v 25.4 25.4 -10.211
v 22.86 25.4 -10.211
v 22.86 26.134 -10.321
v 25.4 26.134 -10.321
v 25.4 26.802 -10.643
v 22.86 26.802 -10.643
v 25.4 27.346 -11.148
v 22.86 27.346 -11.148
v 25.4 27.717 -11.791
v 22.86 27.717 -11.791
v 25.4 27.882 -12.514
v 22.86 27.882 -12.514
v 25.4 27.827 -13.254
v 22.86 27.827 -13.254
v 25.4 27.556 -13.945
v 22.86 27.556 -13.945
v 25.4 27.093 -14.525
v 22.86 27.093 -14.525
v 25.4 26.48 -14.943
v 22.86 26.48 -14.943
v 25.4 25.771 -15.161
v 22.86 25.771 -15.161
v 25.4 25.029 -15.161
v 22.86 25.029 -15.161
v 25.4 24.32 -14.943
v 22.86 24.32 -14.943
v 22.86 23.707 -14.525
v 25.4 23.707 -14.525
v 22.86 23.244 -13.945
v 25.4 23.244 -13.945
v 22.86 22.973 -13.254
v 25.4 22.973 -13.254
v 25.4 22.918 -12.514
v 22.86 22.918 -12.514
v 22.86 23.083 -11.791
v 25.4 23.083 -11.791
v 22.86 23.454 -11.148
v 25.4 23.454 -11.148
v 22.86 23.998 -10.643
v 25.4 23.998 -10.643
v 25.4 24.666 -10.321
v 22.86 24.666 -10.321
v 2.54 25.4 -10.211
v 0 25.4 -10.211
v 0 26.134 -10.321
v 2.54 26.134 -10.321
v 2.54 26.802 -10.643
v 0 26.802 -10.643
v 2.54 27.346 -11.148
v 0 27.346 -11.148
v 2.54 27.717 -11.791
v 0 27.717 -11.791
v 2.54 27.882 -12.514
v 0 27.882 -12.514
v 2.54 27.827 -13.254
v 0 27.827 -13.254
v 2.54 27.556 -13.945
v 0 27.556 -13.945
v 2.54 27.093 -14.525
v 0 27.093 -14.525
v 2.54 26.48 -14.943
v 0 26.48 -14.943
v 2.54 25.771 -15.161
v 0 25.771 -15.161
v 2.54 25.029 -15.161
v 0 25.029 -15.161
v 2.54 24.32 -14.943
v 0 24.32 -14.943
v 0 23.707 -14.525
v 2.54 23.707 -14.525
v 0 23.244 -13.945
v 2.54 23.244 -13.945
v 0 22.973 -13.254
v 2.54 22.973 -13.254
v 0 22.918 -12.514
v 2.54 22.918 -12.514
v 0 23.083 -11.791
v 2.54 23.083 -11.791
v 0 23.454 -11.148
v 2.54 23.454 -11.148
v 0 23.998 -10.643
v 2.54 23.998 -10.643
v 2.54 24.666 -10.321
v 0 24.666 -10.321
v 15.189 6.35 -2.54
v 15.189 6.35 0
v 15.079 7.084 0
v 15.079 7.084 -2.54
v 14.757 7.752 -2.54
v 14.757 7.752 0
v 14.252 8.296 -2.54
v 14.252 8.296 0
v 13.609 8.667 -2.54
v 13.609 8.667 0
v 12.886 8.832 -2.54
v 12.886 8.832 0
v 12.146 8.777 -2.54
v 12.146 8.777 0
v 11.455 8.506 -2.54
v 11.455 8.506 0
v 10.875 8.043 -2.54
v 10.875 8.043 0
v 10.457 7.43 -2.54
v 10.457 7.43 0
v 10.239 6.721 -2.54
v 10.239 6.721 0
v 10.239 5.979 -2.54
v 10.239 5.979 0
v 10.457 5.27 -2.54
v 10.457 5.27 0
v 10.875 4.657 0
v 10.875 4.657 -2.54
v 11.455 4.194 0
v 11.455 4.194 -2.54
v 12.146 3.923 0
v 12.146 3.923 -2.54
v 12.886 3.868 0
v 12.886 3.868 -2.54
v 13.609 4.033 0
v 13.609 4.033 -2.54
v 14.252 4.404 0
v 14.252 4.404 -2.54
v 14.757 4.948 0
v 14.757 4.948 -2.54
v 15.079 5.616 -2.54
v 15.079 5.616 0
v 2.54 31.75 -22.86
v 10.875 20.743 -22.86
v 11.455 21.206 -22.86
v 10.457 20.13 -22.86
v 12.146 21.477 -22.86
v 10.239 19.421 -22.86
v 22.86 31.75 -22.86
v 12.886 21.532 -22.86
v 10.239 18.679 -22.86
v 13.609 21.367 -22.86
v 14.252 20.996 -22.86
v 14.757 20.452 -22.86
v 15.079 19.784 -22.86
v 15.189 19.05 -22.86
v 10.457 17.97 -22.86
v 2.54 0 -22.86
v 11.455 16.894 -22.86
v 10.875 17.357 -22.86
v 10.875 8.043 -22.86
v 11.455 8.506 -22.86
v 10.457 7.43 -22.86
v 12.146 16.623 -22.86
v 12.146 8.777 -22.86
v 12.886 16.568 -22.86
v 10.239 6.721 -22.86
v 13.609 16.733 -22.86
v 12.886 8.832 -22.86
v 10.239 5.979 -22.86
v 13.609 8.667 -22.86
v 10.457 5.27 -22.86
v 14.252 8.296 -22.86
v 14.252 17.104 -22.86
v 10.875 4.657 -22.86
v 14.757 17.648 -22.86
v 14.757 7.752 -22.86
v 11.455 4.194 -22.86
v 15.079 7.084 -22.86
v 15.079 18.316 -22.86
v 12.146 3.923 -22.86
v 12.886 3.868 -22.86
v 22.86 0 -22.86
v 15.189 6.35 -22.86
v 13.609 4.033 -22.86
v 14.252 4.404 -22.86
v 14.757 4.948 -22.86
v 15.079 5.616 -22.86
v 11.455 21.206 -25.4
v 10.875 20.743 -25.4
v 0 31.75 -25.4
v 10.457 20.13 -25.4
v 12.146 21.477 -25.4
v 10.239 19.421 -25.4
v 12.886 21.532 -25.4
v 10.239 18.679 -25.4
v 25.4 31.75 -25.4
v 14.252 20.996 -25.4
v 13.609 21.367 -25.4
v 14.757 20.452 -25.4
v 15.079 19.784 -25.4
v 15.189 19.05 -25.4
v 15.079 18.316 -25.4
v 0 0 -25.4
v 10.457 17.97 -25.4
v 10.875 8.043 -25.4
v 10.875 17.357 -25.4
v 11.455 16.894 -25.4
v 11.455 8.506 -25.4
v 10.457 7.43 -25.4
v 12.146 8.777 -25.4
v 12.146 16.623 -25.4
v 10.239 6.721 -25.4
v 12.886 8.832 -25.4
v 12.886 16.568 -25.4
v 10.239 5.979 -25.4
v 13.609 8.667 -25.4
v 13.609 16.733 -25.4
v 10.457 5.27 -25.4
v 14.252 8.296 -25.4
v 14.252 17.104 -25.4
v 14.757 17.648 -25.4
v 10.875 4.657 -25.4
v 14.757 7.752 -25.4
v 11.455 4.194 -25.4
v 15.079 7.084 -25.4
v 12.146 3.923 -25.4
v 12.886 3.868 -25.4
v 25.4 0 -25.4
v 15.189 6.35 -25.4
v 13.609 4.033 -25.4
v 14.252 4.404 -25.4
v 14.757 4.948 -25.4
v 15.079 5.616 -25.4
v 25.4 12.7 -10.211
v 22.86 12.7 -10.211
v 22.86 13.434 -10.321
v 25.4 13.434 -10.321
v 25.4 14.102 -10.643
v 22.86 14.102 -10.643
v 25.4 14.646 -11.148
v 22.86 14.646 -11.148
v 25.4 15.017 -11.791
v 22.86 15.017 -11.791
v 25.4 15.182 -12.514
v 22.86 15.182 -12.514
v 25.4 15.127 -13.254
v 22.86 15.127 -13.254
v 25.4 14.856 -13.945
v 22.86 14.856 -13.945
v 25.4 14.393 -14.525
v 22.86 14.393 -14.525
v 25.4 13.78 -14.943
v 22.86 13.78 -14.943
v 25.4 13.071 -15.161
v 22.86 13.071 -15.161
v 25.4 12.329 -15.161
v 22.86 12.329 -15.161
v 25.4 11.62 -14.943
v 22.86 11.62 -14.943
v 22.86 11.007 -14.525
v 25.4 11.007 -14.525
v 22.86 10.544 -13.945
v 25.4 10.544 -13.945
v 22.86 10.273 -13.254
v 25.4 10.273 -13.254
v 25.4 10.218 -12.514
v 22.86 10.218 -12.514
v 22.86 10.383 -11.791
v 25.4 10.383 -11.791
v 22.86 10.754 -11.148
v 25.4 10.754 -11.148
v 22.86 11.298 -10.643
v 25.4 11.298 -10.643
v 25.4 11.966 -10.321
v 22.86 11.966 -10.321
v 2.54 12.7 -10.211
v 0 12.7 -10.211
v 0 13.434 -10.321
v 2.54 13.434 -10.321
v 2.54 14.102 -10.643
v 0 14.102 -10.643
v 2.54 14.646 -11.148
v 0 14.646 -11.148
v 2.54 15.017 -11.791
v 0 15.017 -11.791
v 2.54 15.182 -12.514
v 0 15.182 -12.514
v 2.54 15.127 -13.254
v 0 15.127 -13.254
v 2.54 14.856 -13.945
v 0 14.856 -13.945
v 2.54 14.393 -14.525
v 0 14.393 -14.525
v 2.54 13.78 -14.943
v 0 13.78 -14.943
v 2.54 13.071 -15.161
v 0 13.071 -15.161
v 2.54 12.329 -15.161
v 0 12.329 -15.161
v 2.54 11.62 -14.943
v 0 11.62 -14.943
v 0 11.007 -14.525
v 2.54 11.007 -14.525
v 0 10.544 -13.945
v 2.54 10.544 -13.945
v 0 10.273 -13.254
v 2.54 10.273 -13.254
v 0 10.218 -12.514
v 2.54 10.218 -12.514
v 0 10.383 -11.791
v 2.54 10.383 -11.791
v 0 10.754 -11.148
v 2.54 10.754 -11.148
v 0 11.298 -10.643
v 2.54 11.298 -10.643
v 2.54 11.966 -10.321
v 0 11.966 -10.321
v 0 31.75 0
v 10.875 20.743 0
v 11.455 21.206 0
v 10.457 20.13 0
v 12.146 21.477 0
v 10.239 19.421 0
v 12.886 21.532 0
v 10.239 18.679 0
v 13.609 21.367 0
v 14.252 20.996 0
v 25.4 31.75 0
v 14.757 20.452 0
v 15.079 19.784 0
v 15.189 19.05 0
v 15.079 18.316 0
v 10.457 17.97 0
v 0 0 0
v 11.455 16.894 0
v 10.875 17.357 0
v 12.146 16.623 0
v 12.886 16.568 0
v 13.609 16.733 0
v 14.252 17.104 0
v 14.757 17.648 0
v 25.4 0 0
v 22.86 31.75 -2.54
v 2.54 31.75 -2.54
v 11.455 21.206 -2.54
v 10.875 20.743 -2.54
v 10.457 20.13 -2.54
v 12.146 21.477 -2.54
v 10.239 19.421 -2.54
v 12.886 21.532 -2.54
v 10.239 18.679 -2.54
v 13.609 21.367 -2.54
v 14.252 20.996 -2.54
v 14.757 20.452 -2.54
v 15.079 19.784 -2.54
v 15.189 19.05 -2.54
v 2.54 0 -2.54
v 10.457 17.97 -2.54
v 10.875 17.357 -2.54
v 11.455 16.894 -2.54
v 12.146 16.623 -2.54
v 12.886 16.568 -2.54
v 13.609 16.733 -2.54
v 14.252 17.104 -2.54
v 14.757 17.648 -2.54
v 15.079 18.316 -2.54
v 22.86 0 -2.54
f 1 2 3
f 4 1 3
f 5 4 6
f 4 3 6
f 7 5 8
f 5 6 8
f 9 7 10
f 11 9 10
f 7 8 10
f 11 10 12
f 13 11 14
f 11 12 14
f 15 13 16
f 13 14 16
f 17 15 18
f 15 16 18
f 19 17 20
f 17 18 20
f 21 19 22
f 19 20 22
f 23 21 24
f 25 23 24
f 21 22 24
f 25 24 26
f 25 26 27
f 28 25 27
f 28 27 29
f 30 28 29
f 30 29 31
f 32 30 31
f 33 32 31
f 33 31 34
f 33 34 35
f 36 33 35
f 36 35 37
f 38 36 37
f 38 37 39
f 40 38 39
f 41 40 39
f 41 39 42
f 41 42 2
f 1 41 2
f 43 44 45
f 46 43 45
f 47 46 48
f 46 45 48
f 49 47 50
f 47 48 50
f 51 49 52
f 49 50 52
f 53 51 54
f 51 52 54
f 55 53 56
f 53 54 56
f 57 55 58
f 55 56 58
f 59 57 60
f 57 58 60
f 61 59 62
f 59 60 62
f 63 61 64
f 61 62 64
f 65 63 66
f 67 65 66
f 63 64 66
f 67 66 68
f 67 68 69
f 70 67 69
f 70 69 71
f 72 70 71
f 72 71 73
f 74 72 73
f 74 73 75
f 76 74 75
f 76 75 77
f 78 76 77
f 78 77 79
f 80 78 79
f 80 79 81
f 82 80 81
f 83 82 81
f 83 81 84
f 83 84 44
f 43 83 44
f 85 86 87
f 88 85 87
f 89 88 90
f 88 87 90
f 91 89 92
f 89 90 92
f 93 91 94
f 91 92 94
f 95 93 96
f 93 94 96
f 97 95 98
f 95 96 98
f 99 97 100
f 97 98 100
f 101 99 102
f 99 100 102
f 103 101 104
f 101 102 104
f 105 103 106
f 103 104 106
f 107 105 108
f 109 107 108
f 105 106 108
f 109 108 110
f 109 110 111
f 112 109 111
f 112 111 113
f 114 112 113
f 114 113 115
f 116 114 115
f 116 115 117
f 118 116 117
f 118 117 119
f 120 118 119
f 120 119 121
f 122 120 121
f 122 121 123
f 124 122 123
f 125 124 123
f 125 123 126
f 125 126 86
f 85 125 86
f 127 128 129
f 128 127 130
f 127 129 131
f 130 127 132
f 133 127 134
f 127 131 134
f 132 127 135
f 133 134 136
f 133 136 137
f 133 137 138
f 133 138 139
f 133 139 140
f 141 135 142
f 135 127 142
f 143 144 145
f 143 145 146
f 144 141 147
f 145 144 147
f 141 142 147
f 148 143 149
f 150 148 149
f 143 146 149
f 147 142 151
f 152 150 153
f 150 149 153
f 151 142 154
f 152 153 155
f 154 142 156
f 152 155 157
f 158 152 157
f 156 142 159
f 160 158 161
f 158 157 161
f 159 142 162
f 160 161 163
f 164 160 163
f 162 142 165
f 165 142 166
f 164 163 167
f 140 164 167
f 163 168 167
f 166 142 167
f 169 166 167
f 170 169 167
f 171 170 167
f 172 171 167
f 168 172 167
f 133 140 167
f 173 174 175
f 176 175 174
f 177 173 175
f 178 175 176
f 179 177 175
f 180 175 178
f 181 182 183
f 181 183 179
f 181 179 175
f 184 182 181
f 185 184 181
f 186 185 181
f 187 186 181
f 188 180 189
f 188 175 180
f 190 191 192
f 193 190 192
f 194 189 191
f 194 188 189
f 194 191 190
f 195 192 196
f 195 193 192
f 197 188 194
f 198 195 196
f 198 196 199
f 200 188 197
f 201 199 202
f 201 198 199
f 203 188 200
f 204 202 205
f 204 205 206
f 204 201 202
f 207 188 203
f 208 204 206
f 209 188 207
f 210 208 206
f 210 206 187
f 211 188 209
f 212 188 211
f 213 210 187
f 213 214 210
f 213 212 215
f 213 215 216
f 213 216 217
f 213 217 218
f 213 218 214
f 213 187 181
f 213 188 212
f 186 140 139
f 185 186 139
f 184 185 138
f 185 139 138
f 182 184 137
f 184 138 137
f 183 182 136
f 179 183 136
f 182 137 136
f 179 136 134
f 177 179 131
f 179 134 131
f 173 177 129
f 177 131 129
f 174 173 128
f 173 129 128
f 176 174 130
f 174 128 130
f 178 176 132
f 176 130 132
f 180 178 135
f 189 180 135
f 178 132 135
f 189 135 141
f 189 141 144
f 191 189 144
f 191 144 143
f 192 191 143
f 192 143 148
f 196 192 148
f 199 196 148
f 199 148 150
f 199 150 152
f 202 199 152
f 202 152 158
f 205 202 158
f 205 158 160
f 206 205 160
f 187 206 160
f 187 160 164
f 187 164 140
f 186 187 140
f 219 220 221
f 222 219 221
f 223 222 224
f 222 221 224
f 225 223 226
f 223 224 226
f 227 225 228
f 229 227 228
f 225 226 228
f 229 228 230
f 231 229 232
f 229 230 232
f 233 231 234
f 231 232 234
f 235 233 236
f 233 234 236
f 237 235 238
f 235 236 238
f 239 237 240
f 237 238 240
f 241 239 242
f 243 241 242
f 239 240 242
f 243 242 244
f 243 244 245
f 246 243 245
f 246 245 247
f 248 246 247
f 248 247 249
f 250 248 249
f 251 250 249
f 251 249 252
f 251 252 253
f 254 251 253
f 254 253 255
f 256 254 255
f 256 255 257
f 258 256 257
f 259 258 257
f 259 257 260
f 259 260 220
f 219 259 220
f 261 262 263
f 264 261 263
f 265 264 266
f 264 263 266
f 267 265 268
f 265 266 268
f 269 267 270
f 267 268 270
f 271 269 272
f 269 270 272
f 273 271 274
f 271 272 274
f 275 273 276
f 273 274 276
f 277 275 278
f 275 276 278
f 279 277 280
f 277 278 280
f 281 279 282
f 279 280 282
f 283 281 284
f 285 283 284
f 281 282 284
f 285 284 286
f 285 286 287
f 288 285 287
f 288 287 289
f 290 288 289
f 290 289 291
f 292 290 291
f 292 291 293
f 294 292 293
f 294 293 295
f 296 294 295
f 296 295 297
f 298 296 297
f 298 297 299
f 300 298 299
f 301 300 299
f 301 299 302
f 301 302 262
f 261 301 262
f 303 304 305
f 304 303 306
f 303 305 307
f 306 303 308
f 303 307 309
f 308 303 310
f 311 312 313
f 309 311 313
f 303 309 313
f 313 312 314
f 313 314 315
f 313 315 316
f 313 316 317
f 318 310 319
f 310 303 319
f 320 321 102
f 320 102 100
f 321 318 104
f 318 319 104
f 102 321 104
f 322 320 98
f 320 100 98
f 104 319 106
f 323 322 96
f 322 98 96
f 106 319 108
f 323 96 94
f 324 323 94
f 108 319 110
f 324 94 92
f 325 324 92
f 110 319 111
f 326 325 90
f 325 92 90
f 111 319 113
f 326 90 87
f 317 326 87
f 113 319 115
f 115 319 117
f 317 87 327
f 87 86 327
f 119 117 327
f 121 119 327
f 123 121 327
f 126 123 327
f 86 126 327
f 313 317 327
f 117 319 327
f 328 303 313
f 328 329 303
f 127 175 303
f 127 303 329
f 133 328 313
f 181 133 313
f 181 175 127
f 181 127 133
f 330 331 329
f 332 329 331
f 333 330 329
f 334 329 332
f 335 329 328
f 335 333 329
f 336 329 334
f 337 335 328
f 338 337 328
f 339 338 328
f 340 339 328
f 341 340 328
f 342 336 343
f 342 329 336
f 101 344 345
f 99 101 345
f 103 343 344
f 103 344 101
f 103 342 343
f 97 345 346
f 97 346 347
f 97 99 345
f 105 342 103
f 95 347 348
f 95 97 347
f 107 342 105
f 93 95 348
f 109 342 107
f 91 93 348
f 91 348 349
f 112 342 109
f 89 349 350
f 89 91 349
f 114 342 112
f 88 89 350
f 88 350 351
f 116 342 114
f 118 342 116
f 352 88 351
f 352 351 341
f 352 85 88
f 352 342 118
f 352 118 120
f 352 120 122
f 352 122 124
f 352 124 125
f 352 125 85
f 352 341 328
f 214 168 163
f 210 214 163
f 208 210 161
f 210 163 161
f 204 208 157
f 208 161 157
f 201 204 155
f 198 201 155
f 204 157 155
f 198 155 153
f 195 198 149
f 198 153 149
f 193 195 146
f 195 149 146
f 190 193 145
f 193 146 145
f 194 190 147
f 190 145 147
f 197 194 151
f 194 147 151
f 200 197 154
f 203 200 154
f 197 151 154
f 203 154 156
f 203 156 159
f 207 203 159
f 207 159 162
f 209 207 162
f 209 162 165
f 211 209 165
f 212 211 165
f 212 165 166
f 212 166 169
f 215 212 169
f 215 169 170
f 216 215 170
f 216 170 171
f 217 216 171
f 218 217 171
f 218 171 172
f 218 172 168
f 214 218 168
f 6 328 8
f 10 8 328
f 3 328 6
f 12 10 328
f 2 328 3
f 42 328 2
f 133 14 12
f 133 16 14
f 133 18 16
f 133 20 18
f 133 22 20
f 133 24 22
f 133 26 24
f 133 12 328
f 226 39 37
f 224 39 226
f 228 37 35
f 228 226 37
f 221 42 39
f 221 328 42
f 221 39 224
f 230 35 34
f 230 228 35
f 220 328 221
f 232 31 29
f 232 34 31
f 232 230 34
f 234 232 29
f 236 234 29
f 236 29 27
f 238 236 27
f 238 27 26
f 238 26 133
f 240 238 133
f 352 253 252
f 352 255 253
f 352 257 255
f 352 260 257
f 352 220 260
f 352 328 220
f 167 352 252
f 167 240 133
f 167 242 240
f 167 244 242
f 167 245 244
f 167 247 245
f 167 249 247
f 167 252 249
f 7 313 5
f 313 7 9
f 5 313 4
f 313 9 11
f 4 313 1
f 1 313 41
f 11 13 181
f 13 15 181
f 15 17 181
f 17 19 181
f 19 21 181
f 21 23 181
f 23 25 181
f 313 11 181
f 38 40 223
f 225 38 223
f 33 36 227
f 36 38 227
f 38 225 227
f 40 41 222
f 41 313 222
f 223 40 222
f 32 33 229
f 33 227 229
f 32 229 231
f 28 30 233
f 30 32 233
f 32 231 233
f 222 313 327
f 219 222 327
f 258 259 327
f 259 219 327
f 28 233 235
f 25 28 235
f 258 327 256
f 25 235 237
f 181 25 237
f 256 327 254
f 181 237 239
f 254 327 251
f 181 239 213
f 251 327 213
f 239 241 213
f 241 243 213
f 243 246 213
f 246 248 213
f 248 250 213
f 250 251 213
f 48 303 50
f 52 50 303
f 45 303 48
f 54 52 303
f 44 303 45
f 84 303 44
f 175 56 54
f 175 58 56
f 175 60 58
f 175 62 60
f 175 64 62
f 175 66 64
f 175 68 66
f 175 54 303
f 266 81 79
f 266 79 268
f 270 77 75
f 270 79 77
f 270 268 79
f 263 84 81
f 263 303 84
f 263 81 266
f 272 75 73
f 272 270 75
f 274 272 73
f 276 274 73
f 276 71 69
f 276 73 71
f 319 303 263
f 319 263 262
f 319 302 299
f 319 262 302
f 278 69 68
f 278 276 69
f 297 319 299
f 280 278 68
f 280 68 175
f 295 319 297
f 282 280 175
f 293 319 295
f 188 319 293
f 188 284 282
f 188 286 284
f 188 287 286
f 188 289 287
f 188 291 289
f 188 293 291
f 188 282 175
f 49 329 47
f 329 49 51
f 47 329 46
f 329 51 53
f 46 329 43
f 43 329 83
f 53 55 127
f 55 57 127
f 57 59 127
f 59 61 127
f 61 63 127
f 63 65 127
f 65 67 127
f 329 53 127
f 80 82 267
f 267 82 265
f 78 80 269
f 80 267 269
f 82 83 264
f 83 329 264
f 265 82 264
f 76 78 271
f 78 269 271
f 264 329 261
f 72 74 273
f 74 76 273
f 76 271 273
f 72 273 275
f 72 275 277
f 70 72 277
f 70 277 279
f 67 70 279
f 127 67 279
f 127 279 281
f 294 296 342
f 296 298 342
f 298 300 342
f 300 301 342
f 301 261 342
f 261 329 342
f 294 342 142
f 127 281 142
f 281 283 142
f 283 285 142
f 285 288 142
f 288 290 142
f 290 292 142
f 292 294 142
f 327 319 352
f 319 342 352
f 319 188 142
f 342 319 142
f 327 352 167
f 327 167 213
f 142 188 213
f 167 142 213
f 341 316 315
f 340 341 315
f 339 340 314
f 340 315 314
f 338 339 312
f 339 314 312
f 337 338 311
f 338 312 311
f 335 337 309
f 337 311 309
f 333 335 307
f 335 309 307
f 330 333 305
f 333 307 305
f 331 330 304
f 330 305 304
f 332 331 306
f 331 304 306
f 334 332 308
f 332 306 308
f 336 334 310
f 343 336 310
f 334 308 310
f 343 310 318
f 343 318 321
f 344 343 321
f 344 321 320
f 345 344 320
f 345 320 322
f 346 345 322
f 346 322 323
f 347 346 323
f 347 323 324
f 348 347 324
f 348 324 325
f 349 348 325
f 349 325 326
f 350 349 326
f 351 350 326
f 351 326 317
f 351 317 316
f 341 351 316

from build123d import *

# Parameters (mm, degrees)
SKETCH1_W           = 25.4
SKETCH1_H           = 25.4
SKETCH1_W_2         = 20.32
SKETCH1_H_2         = 20.32
EXTRUDE_THIN1_DEPTH = 31.75
SKETCH2_R           = 2.4892
CUT_EXTRUDE1_DEPTH  = 26.4
SKETCH3_R           = 2.4892
CUT_EXTRUDE2_DEPTH  = 26.4


with BuildPart() as part:
    # Sketch1 → Extrude-Thin1 (new body)
    with BuildSketch(Plane(origin=(0, 0, 0), x_dir=(1, 0, 0), z_dir=(0, 1, 0))):
        with Locations((12.7, 12.7)):
            Rectangle(SKETCH1_W, SKETCH1_H)
        with Locations((12.7, 12.7)):
            Rectangle(SKETCH1_W_2, SKETCH1_H_2, mode=Mode.SUBTRACT)
    extrude(amount=EXTRUDE_THIN1_DEPTH)

    # Sketch2 → Cut-Extrude1 (cut, through all)
    with BuildSketch(Plane.XY):
        with Locations((12.7, 19.05)):
            Circle(SKETCH2_R)
        with Locations((12.7, 6.35)):
            Circle(SKETCH2_R)
    extrude(amount=-CUT_EXTRUDE1_DEPTH, mode=Mode.SUBTRACT)

    # Sketch3 → Cut-Extrude2 (cut, through all)
    with BuildSketch(Plane.ZY):
        with Locations((-12.7, 25.4)):
            Circle(SKETCH3_R)
        with Locations((-12.7, 12.7)):
            Circle(SKETCH3_R)
    extrude(amount=-CUT_EXTRUDE2_DEPTH, mode=Mode.SUBTRACT)


solid = part.part
